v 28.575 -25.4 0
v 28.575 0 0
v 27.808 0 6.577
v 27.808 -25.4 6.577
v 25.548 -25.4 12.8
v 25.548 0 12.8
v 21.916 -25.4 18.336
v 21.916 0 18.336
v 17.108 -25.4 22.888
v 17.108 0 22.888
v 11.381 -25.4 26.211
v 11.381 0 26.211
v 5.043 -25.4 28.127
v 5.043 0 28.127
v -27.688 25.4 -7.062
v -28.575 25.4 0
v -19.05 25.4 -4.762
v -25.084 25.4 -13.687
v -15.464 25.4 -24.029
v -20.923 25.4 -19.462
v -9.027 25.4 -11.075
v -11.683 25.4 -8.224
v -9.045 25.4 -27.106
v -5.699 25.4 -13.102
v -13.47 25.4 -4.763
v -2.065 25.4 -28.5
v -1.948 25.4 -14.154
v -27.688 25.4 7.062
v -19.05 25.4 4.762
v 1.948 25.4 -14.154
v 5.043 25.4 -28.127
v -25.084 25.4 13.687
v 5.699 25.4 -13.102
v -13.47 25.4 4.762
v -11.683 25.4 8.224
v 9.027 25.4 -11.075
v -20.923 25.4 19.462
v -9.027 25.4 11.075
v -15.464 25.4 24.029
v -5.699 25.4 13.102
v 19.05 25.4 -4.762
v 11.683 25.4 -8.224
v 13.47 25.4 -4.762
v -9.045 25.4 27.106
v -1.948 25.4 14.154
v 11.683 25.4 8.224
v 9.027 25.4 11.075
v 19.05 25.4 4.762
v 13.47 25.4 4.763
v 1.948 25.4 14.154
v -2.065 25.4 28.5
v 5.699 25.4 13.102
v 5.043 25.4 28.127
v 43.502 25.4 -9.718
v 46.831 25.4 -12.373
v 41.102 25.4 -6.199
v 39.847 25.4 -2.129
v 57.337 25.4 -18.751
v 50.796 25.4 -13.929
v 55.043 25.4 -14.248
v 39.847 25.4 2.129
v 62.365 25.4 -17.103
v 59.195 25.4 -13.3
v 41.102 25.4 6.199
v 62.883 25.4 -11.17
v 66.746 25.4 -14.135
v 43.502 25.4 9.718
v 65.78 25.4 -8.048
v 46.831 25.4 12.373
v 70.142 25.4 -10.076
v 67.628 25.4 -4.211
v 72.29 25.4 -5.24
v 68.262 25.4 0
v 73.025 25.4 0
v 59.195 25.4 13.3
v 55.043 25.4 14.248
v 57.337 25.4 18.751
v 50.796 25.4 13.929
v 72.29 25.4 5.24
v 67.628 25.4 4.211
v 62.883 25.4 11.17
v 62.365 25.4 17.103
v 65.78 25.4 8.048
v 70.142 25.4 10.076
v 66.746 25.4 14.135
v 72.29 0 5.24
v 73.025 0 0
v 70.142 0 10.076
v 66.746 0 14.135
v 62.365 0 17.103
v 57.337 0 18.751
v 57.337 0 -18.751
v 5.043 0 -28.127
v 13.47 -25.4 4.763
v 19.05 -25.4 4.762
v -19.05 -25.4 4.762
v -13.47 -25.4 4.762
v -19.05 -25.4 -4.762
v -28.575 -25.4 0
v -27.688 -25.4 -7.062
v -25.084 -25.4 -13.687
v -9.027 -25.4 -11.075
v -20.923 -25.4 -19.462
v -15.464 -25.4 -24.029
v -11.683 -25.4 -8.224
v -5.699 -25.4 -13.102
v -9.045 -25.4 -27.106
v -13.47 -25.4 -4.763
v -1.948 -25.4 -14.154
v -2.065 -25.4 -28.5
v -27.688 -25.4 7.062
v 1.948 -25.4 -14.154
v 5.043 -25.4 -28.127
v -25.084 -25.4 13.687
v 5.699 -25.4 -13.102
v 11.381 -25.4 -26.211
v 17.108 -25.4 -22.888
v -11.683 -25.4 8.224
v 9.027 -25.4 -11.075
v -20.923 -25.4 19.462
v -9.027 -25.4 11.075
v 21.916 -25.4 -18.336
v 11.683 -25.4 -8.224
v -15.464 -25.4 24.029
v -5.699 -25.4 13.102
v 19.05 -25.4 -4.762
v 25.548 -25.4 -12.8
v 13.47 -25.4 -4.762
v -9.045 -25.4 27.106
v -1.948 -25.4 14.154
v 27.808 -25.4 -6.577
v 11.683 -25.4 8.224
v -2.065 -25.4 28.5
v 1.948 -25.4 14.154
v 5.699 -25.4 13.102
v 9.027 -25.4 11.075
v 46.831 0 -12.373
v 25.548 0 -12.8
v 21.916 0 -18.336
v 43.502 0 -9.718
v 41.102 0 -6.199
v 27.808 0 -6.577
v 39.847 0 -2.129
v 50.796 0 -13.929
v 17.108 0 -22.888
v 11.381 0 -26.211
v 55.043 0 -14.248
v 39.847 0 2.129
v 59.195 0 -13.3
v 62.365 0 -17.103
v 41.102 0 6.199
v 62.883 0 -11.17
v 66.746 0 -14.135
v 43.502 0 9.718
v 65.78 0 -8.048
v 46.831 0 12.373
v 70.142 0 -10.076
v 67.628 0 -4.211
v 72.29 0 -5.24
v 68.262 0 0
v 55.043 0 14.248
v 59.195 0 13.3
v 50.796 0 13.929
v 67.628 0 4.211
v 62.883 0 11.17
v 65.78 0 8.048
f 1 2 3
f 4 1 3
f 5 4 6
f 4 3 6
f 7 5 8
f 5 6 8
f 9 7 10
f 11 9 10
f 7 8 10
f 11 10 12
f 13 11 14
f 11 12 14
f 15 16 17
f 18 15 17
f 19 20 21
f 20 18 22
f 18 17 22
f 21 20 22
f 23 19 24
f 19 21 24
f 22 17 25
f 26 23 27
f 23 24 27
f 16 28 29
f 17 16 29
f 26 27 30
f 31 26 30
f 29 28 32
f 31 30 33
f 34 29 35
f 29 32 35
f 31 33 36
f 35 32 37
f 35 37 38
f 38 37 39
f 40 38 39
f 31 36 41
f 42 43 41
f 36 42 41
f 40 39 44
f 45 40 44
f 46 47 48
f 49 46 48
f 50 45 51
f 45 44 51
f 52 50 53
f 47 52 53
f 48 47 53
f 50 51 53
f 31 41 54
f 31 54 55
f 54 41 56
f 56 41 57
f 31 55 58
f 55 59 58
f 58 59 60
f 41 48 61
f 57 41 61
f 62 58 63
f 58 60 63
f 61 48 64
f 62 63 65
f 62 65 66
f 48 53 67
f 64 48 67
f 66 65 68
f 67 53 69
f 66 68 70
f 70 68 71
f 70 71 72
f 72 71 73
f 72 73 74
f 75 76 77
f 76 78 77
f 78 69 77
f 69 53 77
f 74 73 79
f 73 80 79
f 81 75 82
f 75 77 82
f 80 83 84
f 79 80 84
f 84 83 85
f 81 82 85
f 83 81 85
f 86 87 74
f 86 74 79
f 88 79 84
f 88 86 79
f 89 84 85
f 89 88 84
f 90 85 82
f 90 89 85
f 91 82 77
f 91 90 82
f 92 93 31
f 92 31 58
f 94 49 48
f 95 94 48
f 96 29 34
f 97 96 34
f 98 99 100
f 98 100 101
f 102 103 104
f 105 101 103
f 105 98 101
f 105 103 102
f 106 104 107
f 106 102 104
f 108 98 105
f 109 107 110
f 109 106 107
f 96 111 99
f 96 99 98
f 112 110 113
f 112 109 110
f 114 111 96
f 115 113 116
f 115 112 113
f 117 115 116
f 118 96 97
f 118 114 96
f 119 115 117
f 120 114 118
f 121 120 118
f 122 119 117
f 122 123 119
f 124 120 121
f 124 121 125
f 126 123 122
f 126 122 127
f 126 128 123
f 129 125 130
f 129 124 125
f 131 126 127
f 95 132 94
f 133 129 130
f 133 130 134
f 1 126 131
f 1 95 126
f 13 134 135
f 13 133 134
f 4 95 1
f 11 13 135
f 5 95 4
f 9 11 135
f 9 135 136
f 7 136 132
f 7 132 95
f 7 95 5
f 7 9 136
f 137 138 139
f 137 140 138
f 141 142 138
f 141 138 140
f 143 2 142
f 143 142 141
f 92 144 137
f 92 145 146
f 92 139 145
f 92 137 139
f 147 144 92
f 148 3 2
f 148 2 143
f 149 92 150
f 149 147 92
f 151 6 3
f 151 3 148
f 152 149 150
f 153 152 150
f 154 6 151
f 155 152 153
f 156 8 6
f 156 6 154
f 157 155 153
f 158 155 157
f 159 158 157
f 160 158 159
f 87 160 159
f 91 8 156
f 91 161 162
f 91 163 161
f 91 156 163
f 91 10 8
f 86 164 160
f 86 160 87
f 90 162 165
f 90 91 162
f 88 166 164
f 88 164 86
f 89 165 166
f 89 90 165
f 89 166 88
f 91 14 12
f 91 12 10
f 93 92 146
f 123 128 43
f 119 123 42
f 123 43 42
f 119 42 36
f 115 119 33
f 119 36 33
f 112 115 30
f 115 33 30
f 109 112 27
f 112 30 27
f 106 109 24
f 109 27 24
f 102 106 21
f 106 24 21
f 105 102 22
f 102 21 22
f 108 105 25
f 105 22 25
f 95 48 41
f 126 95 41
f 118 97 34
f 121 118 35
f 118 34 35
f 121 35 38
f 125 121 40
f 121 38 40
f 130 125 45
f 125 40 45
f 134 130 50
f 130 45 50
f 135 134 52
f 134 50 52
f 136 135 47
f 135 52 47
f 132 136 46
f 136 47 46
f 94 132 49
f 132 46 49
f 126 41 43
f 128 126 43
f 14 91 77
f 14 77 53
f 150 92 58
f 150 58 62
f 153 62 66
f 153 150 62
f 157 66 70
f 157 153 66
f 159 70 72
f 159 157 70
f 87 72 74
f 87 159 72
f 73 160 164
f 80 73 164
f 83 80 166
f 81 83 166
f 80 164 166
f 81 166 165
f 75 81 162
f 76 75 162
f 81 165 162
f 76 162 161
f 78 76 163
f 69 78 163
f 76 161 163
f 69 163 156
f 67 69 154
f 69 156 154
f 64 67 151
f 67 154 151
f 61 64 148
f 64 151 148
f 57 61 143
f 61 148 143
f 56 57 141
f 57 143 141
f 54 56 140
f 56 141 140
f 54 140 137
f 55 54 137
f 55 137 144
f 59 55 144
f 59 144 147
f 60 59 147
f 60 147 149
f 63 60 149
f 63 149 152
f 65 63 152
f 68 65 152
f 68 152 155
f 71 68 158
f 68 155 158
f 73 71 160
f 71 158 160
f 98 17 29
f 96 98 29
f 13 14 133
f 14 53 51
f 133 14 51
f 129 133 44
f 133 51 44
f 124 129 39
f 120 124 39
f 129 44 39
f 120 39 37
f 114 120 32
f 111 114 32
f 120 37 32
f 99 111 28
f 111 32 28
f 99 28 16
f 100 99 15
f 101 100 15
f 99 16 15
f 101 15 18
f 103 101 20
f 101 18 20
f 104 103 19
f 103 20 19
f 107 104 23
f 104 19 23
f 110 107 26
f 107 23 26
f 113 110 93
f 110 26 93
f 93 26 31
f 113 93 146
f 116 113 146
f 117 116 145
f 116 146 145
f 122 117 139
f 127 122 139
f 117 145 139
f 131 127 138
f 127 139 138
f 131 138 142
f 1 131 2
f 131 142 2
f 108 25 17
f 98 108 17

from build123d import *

# Parameters (mm, degrees)
F0_R     = 14.2875
F1_DEPTH = 25.4
F2_DEPTH = 25.4


with BuildPart() as f1:
    # F0 (on Front) → F1 (new body)
    with BuildSketch(Plane.XZ):
        with BuildLine():
            ThreePointArc((5.042647, -28.126541), (21.916025, -18.336262), (28.575, 0))
            ThreePointArc((28.575, 0), (21.916025, 18.336262), (5.042647, 28.126541))
            ThreePointArc((5.042647, 28.126541), (-28.575, 0), (5.042647, -28.126541))
        make_face()
        with BuildLine():
            ThreePointArc((-13.470384, 4.7625), (0, 14.2875), (13.470384, 4.7625))
            Line((13.470384, 4.7625), (19.05, 4.7625))
            Line((19.05, 4.7625), (19.05, -4.7625))
            Line((19.05, -4.7625), (13.470384, -4.7625))
            ThreePointArc((13.470384, -4.7625), (0, -14.2875), (-13.470384, -4.7625))
            Line((-13.470384, -4.7625), (-19.05, -4.7625))
            Line((-19.05, -4.7625), (-19.05, 4.7625))
            Line((-19.05, 4.7625), (-13.470384, 4.7625))
        make_face(mode=Mode.SUBTRACT)
        with BuildLine():
            ThreePointArc((73.025, 0), (68.585683, 12.224174), (57.336765, 18.751028))
            ThreePointArc((57.336765, 18.751028), (34.925, 0), (57.336765, -18.751028))
            ThreePointArc((57.336765, -18.751028), (68.585683, -12.224174), (73.025, 0))
        make_face()
        with Locations((53.975, 0)):
            Circle(F0_R, mode=Mode.SUBTRACT)
        with BuildLine():
            ThreePointArc((5.042647, 28.126541), (21.916025, 18.336262), (28.575, 0))
            ThreePointArc((28.575, 0), (21.916025, -18.336262), (5.042647, -28.126541))
            Line((5.042647, -28.126541), (57.336765, -18.751028))
            ThreePointArc((57.336765, -18.751028), (34.925, 0), (57.336765, 18.751028))
            Line((57.336765, 18.751028), (5.042647, 28.126541))
        make_face()
    extrude(amount=-F1_DEPTH)

    # F0 (on Front) → F2 (join)
    with BuildSketch(Plane.XZ):
        with BuildLine():
            ThreePointArc((5.042647, -28.126541), (21.916025, -18.336262), (28.575, 0))
            ThreePointArc((28.575, 0), (21.916025, 18.336262), (5.042647, 28.126541))
            ThreePointArc((5.042647, 28.126541), (-28.575, 0), (5.042647, -28.126541))
        make_face()
        with BuildLine():
            ThreePointArc((-13.470384, 4.7625), (0, 14.2875), (13.470384, 4.7625))
            Line((13.470384, 4.7625), (19.05, 4.7625))
            Line((19.05, 4.7625), (19.05, -4.7625))
            Line((19.05, -4.7625), (13.470384, -4.7625))
            ThreePointArc((13.470384, -4.7625), (0, -14.2875), (-13.470384, -4.7625))
            Line((-13.470384, -4.7625), (-19.05, -4.7625))
            Line((-19.05, -4.7625), (-19.05, 4.7625))
            Line((-19.05, 4.7625), (-13.470384, 4.7625))
        make_face(mode=Mode.SUBTRACT)
    extrude(amount=F2_DEPTH)


solid = f1.part
